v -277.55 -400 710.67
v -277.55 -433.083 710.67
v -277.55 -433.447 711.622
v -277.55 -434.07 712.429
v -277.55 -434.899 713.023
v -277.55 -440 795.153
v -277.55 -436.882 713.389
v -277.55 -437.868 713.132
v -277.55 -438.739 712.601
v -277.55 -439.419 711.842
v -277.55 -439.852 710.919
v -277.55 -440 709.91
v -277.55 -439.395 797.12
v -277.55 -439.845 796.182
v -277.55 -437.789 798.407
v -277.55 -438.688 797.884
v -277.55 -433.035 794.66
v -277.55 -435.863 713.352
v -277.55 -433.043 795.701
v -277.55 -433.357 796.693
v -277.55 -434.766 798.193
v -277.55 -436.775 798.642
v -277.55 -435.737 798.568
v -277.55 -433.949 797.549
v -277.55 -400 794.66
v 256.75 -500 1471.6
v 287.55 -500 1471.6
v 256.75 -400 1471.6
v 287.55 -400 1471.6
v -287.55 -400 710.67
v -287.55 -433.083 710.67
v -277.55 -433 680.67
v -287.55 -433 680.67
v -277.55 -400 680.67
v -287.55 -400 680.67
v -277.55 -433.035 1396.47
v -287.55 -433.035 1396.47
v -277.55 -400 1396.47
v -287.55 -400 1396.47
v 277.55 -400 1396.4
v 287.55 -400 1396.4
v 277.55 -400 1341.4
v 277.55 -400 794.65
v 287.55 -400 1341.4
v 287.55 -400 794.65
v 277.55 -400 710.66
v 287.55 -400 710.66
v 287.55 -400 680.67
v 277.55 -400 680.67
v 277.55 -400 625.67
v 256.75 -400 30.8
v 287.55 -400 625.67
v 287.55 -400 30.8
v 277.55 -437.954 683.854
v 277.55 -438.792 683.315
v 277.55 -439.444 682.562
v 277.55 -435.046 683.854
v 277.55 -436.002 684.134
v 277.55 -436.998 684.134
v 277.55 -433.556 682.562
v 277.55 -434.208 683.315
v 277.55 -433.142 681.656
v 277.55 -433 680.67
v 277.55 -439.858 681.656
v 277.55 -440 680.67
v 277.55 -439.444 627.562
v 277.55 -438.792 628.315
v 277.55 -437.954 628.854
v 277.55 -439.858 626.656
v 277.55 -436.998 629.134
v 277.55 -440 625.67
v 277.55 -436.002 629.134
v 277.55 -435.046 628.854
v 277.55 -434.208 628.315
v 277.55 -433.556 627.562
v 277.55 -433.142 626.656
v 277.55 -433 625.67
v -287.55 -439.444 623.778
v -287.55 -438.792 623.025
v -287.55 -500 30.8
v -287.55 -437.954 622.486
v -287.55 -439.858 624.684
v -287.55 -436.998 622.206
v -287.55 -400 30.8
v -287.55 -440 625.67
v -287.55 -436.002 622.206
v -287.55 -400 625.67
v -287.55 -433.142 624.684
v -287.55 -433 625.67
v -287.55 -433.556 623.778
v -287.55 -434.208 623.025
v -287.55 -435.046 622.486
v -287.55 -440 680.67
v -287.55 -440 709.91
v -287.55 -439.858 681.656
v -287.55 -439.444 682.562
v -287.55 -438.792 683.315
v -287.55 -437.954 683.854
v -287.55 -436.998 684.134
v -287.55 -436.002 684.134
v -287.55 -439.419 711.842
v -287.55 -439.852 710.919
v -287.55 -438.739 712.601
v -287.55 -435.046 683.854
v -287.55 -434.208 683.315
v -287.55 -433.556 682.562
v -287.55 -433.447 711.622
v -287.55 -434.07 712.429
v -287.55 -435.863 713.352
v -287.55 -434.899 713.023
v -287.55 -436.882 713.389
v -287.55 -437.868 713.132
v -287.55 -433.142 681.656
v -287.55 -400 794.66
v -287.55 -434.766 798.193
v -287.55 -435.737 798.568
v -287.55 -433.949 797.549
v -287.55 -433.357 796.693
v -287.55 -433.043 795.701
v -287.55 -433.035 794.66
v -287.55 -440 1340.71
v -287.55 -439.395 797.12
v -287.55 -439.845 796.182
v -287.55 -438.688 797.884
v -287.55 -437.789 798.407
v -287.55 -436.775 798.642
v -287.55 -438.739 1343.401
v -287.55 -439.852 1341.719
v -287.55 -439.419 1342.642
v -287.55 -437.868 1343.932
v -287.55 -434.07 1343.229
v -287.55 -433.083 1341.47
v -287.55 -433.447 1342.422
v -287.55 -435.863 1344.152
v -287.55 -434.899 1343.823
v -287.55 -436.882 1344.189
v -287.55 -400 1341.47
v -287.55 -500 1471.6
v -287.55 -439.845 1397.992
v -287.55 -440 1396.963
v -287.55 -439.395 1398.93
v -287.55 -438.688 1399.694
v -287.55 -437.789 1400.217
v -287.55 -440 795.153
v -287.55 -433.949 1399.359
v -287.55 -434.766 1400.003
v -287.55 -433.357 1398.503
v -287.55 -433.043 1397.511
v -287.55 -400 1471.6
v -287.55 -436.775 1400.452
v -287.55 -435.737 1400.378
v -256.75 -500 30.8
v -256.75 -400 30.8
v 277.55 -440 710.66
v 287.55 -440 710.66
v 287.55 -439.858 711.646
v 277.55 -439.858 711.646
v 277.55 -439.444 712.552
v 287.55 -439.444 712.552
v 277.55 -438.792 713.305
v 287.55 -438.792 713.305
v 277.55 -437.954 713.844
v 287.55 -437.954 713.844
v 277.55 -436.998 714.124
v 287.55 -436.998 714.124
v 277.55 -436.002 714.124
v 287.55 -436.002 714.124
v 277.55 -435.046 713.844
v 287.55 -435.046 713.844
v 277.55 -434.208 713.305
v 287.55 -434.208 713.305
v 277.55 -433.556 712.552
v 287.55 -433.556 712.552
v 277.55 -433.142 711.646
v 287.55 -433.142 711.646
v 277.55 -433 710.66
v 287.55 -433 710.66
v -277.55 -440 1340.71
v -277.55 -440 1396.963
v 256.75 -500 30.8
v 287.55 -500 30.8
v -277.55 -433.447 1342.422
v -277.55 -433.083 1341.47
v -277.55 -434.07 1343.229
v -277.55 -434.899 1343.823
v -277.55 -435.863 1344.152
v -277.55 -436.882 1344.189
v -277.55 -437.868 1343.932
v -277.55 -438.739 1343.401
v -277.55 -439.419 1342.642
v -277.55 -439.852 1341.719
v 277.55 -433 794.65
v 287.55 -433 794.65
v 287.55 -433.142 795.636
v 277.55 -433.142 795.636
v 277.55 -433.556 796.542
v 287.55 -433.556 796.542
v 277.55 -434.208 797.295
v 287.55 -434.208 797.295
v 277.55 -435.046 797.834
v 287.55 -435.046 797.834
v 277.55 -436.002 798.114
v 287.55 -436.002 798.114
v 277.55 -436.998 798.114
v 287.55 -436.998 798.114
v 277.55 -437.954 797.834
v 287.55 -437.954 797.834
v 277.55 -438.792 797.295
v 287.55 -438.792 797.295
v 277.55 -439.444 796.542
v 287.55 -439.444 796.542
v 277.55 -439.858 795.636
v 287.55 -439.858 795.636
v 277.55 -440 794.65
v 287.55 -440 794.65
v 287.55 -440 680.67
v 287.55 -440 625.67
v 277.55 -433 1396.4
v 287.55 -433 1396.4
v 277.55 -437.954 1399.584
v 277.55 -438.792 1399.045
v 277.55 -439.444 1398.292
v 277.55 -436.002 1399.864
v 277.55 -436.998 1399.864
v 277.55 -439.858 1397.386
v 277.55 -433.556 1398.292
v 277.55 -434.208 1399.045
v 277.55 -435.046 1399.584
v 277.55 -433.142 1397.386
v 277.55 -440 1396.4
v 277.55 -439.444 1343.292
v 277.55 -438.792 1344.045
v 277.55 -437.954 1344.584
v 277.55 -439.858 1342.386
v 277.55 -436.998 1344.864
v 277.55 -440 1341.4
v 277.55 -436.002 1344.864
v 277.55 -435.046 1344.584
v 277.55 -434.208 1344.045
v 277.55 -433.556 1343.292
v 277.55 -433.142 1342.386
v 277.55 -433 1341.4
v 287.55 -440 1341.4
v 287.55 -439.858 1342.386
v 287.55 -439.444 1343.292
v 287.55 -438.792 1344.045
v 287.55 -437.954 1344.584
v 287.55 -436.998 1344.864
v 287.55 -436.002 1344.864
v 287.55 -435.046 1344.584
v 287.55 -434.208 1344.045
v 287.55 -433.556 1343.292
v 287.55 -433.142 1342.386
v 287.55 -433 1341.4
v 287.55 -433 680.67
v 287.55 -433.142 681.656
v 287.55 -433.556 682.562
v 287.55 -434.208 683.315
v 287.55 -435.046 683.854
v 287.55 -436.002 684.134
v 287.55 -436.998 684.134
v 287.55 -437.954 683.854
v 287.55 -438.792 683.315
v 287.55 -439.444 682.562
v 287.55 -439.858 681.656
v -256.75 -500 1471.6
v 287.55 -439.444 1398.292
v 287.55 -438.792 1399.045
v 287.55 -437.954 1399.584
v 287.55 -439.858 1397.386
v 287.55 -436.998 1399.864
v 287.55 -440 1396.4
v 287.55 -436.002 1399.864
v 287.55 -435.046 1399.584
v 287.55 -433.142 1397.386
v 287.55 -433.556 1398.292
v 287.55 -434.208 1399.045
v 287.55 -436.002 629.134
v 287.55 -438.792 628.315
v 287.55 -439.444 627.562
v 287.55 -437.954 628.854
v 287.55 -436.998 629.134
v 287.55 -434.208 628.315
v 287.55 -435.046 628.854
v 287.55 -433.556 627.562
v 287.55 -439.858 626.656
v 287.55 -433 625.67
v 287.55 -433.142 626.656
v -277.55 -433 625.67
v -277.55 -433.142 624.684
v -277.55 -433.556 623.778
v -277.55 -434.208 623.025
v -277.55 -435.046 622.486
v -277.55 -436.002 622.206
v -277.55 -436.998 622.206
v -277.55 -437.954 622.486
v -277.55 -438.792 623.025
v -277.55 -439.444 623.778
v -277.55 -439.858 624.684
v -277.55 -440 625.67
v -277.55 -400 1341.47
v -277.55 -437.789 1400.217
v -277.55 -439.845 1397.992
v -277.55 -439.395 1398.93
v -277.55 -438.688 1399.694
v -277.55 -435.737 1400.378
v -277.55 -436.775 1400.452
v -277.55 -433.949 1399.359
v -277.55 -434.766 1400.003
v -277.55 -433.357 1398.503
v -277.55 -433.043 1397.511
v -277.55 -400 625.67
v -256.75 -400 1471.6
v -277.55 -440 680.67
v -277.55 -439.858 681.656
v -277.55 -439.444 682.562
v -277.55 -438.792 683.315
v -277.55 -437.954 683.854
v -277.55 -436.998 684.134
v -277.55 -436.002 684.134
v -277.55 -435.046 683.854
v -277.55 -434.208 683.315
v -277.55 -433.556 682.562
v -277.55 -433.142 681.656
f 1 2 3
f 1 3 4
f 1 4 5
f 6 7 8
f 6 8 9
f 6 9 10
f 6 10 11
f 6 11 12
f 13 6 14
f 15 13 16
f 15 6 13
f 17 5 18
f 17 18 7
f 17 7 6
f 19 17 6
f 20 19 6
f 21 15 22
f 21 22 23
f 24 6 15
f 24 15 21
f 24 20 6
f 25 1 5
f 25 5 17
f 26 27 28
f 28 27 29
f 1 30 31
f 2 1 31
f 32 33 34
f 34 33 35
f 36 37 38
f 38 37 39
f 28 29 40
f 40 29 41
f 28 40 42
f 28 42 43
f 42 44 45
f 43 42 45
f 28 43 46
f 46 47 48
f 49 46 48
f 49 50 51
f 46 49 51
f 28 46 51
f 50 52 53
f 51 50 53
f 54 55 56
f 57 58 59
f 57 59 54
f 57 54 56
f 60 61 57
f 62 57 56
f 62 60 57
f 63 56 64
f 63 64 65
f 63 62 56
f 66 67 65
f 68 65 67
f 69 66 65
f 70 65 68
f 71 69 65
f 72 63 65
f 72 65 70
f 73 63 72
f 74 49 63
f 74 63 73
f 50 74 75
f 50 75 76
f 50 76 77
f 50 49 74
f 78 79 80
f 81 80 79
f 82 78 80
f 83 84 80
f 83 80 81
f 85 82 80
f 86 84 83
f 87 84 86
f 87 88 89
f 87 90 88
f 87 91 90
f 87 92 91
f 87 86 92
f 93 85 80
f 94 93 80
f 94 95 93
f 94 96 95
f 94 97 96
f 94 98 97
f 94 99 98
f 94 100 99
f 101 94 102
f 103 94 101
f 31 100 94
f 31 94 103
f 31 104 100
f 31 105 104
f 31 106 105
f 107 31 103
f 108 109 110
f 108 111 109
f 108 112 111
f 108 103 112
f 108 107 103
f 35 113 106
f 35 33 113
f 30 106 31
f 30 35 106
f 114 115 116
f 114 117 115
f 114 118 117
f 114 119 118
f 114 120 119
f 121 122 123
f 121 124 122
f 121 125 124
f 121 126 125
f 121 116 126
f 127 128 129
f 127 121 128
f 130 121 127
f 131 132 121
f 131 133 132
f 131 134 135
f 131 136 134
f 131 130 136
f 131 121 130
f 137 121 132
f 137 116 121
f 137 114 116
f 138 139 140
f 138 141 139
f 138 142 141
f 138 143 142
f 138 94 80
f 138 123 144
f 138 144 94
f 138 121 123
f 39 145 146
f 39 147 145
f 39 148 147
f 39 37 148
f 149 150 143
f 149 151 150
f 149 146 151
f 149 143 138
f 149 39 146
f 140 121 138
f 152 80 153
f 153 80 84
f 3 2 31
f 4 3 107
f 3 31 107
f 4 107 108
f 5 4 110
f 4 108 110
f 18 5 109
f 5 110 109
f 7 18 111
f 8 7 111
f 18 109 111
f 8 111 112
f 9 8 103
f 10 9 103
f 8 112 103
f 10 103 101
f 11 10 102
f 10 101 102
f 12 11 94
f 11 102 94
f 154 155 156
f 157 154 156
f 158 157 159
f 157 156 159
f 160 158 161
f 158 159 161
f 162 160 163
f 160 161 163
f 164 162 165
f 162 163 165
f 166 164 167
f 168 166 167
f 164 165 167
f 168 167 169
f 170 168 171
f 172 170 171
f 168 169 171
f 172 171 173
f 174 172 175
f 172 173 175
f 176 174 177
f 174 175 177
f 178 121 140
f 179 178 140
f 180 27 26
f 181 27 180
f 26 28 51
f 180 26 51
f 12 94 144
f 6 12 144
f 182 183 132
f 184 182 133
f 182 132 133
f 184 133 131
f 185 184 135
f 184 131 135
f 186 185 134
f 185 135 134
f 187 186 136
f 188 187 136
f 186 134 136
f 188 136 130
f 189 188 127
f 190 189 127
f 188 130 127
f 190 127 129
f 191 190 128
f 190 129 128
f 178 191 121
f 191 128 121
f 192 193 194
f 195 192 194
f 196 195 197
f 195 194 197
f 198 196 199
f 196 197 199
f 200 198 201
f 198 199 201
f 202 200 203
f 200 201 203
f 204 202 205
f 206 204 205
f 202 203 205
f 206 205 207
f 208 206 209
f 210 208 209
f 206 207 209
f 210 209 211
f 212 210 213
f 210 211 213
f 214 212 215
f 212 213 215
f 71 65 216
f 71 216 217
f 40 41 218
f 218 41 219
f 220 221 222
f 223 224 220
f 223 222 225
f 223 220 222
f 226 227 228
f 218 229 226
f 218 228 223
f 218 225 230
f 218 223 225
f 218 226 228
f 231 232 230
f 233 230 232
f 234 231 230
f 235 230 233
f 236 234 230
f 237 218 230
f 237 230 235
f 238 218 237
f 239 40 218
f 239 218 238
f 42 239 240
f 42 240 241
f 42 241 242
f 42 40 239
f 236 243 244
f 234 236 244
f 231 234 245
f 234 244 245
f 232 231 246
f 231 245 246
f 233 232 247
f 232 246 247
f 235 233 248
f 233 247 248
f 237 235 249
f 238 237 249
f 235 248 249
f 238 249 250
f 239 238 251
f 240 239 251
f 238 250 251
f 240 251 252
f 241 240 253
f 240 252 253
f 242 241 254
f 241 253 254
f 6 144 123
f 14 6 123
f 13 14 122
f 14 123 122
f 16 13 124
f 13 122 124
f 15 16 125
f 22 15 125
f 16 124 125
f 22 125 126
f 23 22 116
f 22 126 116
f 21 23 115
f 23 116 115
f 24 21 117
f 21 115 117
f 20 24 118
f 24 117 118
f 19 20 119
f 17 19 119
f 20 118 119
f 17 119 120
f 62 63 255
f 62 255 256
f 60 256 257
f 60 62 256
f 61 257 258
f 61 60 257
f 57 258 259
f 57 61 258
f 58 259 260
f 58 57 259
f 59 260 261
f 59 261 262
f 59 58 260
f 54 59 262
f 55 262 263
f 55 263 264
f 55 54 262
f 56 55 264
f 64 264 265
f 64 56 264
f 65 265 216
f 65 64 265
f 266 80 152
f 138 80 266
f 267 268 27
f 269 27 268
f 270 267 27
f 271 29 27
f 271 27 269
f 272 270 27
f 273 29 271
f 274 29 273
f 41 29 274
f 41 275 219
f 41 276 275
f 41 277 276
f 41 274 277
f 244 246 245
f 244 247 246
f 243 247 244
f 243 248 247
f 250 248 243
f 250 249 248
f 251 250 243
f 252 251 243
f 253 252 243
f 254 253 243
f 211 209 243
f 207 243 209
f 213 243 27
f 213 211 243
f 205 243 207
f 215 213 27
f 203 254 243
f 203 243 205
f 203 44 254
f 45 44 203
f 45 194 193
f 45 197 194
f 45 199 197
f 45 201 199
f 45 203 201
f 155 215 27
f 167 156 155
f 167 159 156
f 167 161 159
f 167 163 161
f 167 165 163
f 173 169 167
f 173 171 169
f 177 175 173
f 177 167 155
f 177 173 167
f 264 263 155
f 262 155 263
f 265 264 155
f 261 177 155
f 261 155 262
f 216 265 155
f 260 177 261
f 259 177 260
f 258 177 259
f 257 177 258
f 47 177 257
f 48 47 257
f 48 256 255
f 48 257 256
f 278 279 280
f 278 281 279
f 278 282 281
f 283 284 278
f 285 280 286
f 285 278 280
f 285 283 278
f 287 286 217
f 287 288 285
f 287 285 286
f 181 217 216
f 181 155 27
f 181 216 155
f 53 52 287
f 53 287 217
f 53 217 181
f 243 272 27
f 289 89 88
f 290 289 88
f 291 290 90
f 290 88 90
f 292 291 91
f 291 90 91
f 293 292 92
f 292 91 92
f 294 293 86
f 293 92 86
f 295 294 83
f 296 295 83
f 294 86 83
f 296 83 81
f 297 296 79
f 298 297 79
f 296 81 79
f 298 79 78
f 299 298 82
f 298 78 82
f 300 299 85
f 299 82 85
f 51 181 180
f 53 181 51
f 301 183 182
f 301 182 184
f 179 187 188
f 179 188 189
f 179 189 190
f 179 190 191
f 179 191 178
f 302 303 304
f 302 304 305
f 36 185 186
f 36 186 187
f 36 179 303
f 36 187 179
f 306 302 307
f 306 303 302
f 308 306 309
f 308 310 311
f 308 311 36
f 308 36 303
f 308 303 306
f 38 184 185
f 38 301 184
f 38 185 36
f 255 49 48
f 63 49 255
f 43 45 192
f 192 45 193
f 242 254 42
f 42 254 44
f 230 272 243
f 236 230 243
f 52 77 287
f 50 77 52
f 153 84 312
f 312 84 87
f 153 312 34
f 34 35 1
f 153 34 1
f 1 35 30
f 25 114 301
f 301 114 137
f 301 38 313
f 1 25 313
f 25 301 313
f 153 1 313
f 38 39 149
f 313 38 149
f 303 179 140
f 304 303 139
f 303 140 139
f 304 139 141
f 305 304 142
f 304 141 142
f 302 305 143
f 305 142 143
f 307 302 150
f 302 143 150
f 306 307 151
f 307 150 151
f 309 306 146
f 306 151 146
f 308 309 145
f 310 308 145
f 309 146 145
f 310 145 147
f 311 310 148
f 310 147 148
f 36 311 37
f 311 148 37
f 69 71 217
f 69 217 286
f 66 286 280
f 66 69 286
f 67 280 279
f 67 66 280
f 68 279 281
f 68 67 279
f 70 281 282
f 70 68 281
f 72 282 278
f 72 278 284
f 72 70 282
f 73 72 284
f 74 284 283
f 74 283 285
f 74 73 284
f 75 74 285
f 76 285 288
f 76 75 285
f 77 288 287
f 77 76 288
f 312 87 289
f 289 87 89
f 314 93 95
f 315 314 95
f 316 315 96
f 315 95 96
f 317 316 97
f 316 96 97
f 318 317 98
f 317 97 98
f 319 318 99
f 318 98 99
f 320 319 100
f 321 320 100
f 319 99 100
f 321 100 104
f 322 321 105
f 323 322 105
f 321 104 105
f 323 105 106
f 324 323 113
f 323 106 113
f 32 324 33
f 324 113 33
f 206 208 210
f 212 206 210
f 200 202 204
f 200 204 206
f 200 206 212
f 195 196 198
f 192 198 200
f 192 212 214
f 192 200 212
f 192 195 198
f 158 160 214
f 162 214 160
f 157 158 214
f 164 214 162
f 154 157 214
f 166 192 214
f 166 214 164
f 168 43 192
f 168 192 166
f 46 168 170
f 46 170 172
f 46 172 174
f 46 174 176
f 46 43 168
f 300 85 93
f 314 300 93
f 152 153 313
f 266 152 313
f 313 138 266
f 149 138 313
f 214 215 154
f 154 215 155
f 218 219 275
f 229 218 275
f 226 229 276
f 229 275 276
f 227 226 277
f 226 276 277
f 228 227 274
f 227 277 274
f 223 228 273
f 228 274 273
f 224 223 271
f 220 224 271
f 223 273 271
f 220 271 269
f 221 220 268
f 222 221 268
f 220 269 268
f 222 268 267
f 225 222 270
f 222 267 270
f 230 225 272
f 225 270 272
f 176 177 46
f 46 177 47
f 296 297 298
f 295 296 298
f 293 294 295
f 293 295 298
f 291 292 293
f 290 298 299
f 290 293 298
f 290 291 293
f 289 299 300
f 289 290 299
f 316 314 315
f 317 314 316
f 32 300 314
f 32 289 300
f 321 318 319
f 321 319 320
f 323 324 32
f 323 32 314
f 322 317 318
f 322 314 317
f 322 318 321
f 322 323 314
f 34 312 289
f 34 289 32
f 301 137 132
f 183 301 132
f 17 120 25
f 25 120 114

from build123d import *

# Parameters (mm, degrees)
SKETCH8_W           = 1440.8
SKETCH8_H           = 100
BOSS_EXTRUDE2_DEPTH = 30.8
CUT_EXTRUDE4_DEPTH  = 10
CUT_EXTRUDE5_DEPTH  = 10
CUT_EXTRUDE6_DEPTH  = 10
SKETCH16_W          = 1440.8
SKETCH16_H          = 100
BOSS_EXTRUDE3_DEPTH = 30.8
CUT_EXTRUDE7_DEPTH  = 10
CUT_EXTRUDE8_DEPTH  = 10
CUT_EXTRUDE9_START  = -10
CUT_EXTRUDE9_DEPTH  = 10


with BuildPart() as part:
    # Sketch8 → Boss-Extrude2 (new body)
    with BuildSketch(Plane.ZY.offset(287.55)):
        with Locations((751.2, -450)):
            Rectangle(SKETCH8_W, SKETCH8_H)
    extrude(amount=-BOSS_EXTRUDE2_DEPTH)

    # Sketch9 → Cut-Extrude4 (cut)
    with BuildSketch(Plane.ZY.offset(287.55)):
        with BuildLine():
            Line((680.67, -433), (680.67, -400))
            Line((680.67, -400), (625.67, -400))
            Line((625.67, -400), (625.67, -433))
            ThreePointArc((625.67, -433), (622.17, -436.5), (625.67, -440))
            Line((625.67, -440), (680.67, -440))
            ThreePointArc((680.67, -440), (684.17, -436.5), (680.67, -433))
        make_face()
    extrude(amount=-CUT_EXTRUDE4_DEPTH, mode=Mode.SUBTRACT)

    # Sketch10 → Cut-Extrude5 (cut)
    with BuildSketch(Plane.ZY.offset(287.55)):
        with BuildLine():
            Line((794.66, -433.034858241), (794.66, -400))
            Line((794.66, -400), (710.67, -400))
            Line((710.67, -400), (710.67, -433.083437478))
            ThreePointArc((710.67, -433.083437478), (713.389406768, -436.882119858), (709.91032867, -440))
            Line((709.91032867, -440), (795.152739883, -440))
            ThreePointArc((795.152739883, -440), (798.644014447, -436.253014328), (794.66, -433.034858241))
        make_face()
    extrude(amount=-CUT_EXTRUDE5_DEPTH, mode=Mode.SUBTRACT)

    # Sketch11 → Cut-Extrude6 (cut)
    with BuildSketch(Plane.ZY.offset(287.55)):
        with BuildLine():
            Line((1396.47, -433.034858241), (1396.47, -400))
            Line((1396.47, -400), (1341.47, -400))
            Line((1341.47, -400), (1341.47, -433.083437478))
            ThreePointArc((1341.47, -433.083437478), (1344.189406768, -436.882119858), (1340.71032867, -440))
            Line((1340.71032867, -440), (1396.962739883, -440))
            ThreePointArc((1396.962739883, -440), (1400.454014447, -436.253014328), (1396.47, -433.034858241))
        make_face()
    extrude(amount=-CUT_EXTRUDE6_DEPTH, mode=Mode.SUBTRACT)


with BuildPart() as body_2:
    # Sketch16 → Boss-Extrude3 (new body)
    with BuildSketch(Plane(origin=(287.55, 0, 0), x_dir=(0, 0, -1), z_dir=(1, 0, 0))):
        with Locations((-751.2, -450)):
            Rectangle(SKETCH16_W, SKETCH16_H)
    extrude(amount=-BOSS_EXTRUDE3_DEPTH)

    # Sketch17 → Cut-Extrude7 (cut)
    with BuildSketch(Plane(origin=(287.55, 0, 0), x_dir=(0, 0, -1), z_dir=(1, 0, 0))):
        with BuildLine():
            Line((-1396.4, -400), (-1396.4, -433))
            ThreePointArc((-1396.4, -433), (-1399.9, -436.5), (-1396.4, -440))
            Line((-1396.4, -440), (-1341.4, -440))
            ThreePointArc((-1341.4, -440), (-1344.9, -436.5), (-1341.4, -433))
            Line((-1341.4, -433), (-1341.4, -400))
            Line((-1341.4, -400), (-1396.4, -400))
        make_face()
    extrude(amount=-CUT_EXTRUDE7_DEPTH, mode=Mode.SUBTRACT)

    # Sketch18 → Cut-Extrude8 (cut)
    with BuildSketch(Plane(origin=(287.55, 0, 0), x_dir=(0, 0, -1), z_dir=(1, 0, 0))):
        with BuildLine():
            Line((-794.65, -400), (-794.65, -433))
            ThreePointArc((-794.65, -433), (-798.15, -436.5), (-794.65, -440))
            Line((-794.65, -440), (-710.66, -440))
            ThreePointArc((-710.66, -440), (-714.16, -436.5), (-710.66, -433))
            Line((-710.66, -433), (-710.66, -400))
            Line((-710.66, -400), (-794.65, -400))
        make_face()
    extrude(amount=-CUT_EXTRUDE8_DEPTH, mode=Mode.SUBTRACT)

    # Sketch19 → Cut-Extrude9 (cut)
    with BuildSketch(Plane(origin=(287.55, 0, 0), x_dir=(0, 0, -1), z_dir=(1, 0, 0)).offset(CUT_EXTRUDE9_START)):
        with BuildLine():
            Line((-680.67, -400), (-680.67, -433))
            ThreePointArc((-680.67, -433), (-684.17, -436.5), (-680.67, -440))
            Line((-680.67, -440), (-625.67, -440))
            ThreePointArc((-625.67, -440), (-629.17, -436.5), (-625.67, -433))
            Line((-625.67, -433), (-625.67, -400))
            Line((-625.67, -400), (-680.67, -400))
        make_face()
    extrude(amount=CUT_EXTRUDE9_DEPTH, mode=Mode.SUBTRACT)


solid = Compound([part.part, body_2.part])
